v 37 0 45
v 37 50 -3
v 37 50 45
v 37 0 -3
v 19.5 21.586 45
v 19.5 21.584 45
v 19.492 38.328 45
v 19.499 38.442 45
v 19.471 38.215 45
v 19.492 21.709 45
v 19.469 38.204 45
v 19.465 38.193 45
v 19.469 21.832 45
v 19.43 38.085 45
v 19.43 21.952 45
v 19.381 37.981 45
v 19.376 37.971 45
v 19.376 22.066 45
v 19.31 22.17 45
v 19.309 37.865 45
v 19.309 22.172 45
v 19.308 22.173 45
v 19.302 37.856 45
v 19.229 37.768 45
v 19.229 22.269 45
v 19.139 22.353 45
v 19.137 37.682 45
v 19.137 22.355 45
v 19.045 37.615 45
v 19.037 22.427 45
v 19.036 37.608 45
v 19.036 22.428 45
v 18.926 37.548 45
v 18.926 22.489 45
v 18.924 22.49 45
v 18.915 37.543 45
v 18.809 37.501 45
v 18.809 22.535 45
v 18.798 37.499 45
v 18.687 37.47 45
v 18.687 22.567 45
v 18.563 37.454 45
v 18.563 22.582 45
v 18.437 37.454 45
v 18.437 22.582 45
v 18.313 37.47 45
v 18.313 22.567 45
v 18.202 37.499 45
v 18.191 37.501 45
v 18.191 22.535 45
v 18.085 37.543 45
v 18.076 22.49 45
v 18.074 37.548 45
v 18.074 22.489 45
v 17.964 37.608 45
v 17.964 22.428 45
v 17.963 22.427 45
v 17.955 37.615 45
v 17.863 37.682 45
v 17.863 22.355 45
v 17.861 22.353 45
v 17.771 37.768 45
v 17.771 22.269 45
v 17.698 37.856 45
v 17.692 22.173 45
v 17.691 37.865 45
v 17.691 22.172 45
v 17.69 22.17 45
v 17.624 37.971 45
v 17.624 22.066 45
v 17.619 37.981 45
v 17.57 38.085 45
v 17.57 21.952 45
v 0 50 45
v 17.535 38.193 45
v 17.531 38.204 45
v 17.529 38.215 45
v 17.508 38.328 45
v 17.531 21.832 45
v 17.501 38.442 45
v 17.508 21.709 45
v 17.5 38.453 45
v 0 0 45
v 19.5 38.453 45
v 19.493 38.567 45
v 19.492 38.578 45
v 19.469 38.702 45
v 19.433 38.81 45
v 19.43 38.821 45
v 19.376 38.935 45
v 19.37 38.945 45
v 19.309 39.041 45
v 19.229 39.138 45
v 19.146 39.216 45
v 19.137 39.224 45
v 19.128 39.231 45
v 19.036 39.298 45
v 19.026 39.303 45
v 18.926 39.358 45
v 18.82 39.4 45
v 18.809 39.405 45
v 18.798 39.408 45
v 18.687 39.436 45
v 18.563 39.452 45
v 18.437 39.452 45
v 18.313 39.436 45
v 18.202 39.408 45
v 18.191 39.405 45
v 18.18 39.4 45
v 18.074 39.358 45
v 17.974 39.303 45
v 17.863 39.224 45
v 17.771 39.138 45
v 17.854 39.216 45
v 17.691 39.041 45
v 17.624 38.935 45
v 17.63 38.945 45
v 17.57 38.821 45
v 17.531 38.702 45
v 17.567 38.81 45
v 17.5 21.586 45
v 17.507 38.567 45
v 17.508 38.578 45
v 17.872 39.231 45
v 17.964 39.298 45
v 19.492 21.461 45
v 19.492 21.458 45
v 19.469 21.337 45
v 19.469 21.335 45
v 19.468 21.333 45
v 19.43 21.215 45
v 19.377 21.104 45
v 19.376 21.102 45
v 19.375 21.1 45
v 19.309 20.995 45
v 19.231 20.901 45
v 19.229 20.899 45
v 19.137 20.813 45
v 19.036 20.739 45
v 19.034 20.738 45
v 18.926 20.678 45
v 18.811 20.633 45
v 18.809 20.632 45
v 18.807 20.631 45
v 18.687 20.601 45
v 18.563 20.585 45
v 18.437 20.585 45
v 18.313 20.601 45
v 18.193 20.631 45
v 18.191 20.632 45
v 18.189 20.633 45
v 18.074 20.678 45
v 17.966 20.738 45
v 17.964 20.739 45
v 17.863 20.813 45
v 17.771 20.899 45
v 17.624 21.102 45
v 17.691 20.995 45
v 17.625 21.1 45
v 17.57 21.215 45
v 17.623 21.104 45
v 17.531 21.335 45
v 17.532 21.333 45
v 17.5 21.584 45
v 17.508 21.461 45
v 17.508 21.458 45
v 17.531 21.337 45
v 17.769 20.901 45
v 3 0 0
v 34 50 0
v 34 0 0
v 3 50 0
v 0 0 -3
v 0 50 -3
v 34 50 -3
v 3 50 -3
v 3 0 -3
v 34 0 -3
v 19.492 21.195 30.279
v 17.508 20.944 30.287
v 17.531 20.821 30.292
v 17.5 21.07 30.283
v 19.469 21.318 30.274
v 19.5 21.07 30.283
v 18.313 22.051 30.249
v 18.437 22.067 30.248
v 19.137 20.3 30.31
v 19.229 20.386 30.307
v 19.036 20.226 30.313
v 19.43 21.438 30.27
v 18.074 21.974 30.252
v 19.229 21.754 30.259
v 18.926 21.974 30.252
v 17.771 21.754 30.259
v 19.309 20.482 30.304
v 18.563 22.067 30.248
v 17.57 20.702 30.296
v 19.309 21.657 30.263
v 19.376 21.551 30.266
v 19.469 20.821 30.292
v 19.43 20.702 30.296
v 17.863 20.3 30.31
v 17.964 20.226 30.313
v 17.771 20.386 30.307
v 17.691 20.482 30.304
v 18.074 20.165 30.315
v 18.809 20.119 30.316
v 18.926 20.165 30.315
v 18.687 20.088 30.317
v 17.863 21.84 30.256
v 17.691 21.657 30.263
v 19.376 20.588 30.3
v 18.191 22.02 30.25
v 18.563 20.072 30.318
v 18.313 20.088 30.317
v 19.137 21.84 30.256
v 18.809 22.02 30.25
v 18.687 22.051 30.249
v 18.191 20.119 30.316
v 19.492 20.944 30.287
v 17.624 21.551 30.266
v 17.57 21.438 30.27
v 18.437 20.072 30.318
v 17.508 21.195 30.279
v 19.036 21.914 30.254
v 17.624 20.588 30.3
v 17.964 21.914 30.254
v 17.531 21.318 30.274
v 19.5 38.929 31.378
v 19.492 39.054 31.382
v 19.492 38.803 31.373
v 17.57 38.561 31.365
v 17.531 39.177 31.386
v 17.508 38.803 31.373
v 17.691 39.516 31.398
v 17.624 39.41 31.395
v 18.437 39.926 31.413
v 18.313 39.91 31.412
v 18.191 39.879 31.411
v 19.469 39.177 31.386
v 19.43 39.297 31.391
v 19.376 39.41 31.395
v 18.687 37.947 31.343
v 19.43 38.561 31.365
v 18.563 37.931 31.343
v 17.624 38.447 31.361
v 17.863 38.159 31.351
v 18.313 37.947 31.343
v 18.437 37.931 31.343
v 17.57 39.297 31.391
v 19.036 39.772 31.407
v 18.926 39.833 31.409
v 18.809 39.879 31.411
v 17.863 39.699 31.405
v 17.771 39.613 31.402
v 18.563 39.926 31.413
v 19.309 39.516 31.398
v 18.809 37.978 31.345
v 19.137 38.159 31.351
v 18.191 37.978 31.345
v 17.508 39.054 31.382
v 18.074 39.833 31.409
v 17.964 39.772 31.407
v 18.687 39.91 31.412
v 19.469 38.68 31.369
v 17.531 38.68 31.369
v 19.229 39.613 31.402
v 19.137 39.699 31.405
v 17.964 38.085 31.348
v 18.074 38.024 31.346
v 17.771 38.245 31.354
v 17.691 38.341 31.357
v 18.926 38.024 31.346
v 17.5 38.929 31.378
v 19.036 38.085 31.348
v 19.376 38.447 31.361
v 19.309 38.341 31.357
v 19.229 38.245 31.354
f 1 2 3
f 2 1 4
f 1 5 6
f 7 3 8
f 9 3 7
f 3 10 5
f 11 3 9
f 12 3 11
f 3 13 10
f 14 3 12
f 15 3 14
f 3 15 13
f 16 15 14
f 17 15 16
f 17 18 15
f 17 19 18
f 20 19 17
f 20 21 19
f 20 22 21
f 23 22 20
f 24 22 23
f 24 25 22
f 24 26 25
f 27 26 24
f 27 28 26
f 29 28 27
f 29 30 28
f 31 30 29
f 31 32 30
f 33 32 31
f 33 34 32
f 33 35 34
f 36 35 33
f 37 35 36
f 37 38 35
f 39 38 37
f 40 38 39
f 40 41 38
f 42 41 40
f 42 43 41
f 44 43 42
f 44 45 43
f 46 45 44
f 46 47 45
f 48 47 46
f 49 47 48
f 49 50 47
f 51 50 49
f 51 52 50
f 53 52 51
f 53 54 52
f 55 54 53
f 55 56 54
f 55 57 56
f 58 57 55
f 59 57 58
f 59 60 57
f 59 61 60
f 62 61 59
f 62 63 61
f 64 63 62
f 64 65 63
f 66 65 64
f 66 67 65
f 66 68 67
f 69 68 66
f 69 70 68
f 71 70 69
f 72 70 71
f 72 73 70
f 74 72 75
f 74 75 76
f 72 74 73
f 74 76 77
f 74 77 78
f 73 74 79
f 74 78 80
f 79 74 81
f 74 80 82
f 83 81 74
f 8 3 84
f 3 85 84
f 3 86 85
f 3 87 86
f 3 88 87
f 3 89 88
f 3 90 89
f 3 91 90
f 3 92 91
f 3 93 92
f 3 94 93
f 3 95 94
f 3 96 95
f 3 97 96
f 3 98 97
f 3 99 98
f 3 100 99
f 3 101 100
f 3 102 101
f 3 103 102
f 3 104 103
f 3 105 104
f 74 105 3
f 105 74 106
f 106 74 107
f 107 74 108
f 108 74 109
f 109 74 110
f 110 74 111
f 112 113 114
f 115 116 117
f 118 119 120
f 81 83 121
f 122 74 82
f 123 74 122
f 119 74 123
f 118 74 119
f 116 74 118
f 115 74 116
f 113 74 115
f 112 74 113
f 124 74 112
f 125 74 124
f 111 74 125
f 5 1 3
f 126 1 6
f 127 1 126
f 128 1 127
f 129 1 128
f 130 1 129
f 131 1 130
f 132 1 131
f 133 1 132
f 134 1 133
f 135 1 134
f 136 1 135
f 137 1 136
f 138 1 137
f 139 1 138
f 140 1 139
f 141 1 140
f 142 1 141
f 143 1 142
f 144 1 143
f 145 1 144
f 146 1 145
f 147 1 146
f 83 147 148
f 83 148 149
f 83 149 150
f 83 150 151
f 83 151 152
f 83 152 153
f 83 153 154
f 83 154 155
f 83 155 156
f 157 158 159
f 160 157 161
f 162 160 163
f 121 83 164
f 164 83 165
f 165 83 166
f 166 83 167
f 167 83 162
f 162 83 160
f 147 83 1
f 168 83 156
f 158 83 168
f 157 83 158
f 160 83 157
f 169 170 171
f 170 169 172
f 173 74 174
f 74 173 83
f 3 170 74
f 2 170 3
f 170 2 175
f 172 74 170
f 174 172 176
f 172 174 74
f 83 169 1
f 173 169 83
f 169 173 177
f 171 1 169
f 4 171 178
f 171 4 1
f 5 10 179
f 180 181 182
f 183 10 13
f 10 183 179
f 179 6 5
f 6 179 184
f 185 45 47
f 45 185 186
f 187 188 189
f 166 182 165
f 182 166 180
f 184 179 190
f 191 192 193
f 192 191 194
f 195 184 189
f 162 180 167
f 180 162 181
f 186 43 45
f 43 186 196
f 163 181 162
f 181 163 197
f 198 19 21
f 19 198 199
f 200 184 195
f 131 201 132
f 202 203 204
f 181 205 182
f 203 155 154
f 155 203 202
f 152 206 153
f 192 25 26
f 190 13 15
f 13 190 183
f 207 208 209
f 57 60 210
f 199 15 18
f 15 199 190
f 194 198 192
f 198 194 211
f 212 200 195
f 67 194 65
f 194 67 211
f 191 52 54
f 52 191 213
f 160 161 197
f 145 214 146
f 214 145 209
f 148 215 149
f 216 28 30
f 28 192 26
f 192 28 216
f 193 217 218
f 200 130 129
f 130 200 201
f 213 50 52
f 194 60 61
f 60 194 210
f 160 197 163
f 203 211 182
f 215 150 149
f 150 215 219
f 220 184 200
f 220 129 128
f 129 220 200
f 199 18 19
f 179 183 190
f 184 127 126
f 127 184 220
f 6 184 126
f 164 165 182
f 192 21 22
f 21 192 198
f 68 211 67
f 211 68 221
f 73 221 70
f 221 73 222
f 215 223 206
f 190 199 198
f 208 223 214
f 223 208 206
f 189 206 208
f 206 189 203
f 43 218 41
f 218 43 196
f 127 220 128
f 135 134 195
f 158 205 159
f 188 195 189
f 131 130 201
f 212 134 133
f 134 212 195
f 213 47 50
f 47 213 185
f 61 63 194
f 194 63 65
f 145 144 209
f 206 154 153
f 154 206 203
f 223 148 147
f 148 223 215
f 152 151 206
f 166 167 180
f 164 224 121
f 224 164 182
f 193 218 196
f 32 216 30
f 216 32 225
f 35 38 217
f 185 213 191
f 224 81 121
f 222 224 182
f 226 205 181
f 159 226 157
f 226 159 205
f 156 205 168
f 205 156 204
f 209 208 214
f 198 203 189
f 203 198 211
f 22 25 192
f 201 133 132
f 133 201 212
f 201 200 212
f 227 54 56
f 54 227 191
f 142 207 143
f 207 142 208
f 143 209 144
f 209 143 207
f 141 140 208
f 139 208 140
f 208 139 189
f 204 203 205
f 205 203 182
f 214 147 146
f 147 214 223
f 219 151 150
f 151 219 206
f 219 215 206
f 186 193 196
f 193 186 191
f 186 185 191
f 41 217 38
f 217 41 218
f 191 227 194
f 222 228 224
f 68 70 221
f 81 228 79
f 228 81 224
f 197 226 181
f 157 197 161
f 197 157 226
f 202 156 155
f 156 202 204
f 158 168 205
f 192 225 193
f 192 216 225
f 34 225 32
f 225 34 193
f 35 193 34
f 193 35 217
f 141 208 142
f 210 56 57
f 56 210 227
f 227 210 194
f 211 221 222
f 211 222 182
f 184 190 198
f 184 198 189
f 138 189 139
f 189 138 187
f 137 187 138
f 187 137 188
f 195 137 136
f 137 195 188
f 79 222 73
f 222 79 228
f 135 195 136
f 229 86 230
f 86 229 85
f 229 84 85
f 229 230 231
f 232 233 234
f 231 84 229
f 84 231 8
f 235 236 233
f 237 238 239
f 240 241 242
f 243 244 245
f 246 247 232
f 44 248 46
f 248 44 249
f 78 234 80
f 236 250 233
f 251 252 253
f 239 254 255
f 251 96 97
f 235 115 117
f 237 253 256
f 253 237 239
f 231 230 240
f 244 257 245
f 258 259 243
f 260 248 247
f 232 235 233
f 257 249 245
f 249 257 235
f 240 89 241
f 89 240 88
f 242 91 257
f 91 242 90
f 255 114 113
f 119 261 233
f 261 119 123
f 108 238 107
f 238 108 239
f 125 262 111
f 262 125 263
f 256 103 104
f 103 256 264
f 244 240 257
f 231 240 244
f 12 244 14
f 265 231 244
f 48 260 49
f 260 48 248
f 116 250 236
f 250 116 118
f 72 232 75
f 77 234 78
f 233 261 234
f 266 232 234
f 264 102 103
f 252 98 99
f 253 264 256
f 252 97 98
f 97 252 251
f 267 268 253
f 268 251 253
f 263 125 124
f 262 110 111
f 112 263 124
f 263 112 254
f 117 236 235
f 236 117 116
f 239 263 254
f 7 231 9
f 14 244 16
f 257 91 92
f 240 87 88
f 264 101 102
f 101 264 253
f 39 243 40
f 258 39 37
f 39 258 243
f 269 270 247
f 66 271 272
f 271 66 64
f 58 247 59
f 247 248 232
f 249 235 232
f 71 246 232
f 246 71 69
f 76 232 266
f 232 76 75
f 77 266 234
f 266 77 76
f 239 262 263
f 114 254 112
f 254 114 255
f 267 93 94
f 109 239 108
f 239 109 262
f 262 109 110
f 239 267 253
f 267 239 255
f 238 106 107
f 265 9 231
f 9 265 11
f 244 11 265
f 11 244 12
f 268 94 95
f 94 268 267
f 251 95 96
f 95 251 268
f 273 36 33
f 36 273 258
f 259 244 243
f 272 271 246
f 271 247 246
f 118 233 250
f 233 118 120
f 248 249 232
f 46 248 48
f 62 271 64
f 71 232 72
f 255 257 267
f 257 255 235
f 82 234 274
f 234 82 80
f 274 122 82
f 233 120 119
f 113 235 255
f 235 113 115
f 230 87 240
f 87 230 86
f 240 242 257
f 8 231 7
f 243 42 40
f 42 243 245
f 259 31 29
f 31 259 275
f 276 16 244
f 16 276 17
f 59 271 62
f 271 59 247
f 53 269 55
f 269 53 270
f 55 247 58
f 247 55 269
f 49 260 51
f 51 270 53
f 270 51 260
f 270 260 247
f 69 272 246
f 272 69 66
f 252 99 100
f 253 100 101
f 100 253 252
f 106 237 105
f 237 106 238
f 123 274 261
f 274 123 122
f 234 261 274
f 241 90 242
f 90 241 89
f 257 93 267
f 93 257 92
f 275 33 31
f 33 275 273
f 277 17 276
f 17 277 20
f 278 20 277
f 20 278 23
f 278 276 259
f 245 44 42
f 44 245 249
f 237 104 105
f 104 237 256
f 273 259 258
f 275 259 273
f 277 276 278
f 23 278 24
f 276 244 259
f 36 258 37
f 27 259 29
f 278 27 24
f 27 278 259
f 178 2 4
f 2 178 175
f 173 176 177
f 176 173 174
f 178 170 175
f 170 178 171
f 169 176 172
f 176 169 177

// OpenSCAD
cube_x=31;
cube_y=50;
cube_z=45;
border_thickness=3;
border_z=3;
drill_diameter=2;
drill_z=15;
$fn=50;

module mainCube(){
cube([cube_x+2*border_thickness,cube_y,cube_z]);
}

module rails(){
    difference(){
        translate ([0,0,-border_z]) cube([cube_x+2*border_thickness,cube_y,border_z]);
        translate ([+border_thickness,0,-border_z]) cube([cube_x,cube_y,border_z]);
    }
}

module mainCubeDrilled(){
difference(){
        mainCube();
      #  rotate([-2,0,0]) translate([(cube_x+2*border_thickness)/2,cube_y/2-5,cube_z-drill_z+1]) cylinder(d=drill_diameter,h=drill_z);
      #  rotate([2,0,0]) translate([0,20,0]) translate([(cube_x+2*border_thickness)/2,cube_y/2-5,cube_z-drill_z]) cylinder(d=drill_diameter,h=drill_z);
}
}

mainCubeDrilled();
rails();
